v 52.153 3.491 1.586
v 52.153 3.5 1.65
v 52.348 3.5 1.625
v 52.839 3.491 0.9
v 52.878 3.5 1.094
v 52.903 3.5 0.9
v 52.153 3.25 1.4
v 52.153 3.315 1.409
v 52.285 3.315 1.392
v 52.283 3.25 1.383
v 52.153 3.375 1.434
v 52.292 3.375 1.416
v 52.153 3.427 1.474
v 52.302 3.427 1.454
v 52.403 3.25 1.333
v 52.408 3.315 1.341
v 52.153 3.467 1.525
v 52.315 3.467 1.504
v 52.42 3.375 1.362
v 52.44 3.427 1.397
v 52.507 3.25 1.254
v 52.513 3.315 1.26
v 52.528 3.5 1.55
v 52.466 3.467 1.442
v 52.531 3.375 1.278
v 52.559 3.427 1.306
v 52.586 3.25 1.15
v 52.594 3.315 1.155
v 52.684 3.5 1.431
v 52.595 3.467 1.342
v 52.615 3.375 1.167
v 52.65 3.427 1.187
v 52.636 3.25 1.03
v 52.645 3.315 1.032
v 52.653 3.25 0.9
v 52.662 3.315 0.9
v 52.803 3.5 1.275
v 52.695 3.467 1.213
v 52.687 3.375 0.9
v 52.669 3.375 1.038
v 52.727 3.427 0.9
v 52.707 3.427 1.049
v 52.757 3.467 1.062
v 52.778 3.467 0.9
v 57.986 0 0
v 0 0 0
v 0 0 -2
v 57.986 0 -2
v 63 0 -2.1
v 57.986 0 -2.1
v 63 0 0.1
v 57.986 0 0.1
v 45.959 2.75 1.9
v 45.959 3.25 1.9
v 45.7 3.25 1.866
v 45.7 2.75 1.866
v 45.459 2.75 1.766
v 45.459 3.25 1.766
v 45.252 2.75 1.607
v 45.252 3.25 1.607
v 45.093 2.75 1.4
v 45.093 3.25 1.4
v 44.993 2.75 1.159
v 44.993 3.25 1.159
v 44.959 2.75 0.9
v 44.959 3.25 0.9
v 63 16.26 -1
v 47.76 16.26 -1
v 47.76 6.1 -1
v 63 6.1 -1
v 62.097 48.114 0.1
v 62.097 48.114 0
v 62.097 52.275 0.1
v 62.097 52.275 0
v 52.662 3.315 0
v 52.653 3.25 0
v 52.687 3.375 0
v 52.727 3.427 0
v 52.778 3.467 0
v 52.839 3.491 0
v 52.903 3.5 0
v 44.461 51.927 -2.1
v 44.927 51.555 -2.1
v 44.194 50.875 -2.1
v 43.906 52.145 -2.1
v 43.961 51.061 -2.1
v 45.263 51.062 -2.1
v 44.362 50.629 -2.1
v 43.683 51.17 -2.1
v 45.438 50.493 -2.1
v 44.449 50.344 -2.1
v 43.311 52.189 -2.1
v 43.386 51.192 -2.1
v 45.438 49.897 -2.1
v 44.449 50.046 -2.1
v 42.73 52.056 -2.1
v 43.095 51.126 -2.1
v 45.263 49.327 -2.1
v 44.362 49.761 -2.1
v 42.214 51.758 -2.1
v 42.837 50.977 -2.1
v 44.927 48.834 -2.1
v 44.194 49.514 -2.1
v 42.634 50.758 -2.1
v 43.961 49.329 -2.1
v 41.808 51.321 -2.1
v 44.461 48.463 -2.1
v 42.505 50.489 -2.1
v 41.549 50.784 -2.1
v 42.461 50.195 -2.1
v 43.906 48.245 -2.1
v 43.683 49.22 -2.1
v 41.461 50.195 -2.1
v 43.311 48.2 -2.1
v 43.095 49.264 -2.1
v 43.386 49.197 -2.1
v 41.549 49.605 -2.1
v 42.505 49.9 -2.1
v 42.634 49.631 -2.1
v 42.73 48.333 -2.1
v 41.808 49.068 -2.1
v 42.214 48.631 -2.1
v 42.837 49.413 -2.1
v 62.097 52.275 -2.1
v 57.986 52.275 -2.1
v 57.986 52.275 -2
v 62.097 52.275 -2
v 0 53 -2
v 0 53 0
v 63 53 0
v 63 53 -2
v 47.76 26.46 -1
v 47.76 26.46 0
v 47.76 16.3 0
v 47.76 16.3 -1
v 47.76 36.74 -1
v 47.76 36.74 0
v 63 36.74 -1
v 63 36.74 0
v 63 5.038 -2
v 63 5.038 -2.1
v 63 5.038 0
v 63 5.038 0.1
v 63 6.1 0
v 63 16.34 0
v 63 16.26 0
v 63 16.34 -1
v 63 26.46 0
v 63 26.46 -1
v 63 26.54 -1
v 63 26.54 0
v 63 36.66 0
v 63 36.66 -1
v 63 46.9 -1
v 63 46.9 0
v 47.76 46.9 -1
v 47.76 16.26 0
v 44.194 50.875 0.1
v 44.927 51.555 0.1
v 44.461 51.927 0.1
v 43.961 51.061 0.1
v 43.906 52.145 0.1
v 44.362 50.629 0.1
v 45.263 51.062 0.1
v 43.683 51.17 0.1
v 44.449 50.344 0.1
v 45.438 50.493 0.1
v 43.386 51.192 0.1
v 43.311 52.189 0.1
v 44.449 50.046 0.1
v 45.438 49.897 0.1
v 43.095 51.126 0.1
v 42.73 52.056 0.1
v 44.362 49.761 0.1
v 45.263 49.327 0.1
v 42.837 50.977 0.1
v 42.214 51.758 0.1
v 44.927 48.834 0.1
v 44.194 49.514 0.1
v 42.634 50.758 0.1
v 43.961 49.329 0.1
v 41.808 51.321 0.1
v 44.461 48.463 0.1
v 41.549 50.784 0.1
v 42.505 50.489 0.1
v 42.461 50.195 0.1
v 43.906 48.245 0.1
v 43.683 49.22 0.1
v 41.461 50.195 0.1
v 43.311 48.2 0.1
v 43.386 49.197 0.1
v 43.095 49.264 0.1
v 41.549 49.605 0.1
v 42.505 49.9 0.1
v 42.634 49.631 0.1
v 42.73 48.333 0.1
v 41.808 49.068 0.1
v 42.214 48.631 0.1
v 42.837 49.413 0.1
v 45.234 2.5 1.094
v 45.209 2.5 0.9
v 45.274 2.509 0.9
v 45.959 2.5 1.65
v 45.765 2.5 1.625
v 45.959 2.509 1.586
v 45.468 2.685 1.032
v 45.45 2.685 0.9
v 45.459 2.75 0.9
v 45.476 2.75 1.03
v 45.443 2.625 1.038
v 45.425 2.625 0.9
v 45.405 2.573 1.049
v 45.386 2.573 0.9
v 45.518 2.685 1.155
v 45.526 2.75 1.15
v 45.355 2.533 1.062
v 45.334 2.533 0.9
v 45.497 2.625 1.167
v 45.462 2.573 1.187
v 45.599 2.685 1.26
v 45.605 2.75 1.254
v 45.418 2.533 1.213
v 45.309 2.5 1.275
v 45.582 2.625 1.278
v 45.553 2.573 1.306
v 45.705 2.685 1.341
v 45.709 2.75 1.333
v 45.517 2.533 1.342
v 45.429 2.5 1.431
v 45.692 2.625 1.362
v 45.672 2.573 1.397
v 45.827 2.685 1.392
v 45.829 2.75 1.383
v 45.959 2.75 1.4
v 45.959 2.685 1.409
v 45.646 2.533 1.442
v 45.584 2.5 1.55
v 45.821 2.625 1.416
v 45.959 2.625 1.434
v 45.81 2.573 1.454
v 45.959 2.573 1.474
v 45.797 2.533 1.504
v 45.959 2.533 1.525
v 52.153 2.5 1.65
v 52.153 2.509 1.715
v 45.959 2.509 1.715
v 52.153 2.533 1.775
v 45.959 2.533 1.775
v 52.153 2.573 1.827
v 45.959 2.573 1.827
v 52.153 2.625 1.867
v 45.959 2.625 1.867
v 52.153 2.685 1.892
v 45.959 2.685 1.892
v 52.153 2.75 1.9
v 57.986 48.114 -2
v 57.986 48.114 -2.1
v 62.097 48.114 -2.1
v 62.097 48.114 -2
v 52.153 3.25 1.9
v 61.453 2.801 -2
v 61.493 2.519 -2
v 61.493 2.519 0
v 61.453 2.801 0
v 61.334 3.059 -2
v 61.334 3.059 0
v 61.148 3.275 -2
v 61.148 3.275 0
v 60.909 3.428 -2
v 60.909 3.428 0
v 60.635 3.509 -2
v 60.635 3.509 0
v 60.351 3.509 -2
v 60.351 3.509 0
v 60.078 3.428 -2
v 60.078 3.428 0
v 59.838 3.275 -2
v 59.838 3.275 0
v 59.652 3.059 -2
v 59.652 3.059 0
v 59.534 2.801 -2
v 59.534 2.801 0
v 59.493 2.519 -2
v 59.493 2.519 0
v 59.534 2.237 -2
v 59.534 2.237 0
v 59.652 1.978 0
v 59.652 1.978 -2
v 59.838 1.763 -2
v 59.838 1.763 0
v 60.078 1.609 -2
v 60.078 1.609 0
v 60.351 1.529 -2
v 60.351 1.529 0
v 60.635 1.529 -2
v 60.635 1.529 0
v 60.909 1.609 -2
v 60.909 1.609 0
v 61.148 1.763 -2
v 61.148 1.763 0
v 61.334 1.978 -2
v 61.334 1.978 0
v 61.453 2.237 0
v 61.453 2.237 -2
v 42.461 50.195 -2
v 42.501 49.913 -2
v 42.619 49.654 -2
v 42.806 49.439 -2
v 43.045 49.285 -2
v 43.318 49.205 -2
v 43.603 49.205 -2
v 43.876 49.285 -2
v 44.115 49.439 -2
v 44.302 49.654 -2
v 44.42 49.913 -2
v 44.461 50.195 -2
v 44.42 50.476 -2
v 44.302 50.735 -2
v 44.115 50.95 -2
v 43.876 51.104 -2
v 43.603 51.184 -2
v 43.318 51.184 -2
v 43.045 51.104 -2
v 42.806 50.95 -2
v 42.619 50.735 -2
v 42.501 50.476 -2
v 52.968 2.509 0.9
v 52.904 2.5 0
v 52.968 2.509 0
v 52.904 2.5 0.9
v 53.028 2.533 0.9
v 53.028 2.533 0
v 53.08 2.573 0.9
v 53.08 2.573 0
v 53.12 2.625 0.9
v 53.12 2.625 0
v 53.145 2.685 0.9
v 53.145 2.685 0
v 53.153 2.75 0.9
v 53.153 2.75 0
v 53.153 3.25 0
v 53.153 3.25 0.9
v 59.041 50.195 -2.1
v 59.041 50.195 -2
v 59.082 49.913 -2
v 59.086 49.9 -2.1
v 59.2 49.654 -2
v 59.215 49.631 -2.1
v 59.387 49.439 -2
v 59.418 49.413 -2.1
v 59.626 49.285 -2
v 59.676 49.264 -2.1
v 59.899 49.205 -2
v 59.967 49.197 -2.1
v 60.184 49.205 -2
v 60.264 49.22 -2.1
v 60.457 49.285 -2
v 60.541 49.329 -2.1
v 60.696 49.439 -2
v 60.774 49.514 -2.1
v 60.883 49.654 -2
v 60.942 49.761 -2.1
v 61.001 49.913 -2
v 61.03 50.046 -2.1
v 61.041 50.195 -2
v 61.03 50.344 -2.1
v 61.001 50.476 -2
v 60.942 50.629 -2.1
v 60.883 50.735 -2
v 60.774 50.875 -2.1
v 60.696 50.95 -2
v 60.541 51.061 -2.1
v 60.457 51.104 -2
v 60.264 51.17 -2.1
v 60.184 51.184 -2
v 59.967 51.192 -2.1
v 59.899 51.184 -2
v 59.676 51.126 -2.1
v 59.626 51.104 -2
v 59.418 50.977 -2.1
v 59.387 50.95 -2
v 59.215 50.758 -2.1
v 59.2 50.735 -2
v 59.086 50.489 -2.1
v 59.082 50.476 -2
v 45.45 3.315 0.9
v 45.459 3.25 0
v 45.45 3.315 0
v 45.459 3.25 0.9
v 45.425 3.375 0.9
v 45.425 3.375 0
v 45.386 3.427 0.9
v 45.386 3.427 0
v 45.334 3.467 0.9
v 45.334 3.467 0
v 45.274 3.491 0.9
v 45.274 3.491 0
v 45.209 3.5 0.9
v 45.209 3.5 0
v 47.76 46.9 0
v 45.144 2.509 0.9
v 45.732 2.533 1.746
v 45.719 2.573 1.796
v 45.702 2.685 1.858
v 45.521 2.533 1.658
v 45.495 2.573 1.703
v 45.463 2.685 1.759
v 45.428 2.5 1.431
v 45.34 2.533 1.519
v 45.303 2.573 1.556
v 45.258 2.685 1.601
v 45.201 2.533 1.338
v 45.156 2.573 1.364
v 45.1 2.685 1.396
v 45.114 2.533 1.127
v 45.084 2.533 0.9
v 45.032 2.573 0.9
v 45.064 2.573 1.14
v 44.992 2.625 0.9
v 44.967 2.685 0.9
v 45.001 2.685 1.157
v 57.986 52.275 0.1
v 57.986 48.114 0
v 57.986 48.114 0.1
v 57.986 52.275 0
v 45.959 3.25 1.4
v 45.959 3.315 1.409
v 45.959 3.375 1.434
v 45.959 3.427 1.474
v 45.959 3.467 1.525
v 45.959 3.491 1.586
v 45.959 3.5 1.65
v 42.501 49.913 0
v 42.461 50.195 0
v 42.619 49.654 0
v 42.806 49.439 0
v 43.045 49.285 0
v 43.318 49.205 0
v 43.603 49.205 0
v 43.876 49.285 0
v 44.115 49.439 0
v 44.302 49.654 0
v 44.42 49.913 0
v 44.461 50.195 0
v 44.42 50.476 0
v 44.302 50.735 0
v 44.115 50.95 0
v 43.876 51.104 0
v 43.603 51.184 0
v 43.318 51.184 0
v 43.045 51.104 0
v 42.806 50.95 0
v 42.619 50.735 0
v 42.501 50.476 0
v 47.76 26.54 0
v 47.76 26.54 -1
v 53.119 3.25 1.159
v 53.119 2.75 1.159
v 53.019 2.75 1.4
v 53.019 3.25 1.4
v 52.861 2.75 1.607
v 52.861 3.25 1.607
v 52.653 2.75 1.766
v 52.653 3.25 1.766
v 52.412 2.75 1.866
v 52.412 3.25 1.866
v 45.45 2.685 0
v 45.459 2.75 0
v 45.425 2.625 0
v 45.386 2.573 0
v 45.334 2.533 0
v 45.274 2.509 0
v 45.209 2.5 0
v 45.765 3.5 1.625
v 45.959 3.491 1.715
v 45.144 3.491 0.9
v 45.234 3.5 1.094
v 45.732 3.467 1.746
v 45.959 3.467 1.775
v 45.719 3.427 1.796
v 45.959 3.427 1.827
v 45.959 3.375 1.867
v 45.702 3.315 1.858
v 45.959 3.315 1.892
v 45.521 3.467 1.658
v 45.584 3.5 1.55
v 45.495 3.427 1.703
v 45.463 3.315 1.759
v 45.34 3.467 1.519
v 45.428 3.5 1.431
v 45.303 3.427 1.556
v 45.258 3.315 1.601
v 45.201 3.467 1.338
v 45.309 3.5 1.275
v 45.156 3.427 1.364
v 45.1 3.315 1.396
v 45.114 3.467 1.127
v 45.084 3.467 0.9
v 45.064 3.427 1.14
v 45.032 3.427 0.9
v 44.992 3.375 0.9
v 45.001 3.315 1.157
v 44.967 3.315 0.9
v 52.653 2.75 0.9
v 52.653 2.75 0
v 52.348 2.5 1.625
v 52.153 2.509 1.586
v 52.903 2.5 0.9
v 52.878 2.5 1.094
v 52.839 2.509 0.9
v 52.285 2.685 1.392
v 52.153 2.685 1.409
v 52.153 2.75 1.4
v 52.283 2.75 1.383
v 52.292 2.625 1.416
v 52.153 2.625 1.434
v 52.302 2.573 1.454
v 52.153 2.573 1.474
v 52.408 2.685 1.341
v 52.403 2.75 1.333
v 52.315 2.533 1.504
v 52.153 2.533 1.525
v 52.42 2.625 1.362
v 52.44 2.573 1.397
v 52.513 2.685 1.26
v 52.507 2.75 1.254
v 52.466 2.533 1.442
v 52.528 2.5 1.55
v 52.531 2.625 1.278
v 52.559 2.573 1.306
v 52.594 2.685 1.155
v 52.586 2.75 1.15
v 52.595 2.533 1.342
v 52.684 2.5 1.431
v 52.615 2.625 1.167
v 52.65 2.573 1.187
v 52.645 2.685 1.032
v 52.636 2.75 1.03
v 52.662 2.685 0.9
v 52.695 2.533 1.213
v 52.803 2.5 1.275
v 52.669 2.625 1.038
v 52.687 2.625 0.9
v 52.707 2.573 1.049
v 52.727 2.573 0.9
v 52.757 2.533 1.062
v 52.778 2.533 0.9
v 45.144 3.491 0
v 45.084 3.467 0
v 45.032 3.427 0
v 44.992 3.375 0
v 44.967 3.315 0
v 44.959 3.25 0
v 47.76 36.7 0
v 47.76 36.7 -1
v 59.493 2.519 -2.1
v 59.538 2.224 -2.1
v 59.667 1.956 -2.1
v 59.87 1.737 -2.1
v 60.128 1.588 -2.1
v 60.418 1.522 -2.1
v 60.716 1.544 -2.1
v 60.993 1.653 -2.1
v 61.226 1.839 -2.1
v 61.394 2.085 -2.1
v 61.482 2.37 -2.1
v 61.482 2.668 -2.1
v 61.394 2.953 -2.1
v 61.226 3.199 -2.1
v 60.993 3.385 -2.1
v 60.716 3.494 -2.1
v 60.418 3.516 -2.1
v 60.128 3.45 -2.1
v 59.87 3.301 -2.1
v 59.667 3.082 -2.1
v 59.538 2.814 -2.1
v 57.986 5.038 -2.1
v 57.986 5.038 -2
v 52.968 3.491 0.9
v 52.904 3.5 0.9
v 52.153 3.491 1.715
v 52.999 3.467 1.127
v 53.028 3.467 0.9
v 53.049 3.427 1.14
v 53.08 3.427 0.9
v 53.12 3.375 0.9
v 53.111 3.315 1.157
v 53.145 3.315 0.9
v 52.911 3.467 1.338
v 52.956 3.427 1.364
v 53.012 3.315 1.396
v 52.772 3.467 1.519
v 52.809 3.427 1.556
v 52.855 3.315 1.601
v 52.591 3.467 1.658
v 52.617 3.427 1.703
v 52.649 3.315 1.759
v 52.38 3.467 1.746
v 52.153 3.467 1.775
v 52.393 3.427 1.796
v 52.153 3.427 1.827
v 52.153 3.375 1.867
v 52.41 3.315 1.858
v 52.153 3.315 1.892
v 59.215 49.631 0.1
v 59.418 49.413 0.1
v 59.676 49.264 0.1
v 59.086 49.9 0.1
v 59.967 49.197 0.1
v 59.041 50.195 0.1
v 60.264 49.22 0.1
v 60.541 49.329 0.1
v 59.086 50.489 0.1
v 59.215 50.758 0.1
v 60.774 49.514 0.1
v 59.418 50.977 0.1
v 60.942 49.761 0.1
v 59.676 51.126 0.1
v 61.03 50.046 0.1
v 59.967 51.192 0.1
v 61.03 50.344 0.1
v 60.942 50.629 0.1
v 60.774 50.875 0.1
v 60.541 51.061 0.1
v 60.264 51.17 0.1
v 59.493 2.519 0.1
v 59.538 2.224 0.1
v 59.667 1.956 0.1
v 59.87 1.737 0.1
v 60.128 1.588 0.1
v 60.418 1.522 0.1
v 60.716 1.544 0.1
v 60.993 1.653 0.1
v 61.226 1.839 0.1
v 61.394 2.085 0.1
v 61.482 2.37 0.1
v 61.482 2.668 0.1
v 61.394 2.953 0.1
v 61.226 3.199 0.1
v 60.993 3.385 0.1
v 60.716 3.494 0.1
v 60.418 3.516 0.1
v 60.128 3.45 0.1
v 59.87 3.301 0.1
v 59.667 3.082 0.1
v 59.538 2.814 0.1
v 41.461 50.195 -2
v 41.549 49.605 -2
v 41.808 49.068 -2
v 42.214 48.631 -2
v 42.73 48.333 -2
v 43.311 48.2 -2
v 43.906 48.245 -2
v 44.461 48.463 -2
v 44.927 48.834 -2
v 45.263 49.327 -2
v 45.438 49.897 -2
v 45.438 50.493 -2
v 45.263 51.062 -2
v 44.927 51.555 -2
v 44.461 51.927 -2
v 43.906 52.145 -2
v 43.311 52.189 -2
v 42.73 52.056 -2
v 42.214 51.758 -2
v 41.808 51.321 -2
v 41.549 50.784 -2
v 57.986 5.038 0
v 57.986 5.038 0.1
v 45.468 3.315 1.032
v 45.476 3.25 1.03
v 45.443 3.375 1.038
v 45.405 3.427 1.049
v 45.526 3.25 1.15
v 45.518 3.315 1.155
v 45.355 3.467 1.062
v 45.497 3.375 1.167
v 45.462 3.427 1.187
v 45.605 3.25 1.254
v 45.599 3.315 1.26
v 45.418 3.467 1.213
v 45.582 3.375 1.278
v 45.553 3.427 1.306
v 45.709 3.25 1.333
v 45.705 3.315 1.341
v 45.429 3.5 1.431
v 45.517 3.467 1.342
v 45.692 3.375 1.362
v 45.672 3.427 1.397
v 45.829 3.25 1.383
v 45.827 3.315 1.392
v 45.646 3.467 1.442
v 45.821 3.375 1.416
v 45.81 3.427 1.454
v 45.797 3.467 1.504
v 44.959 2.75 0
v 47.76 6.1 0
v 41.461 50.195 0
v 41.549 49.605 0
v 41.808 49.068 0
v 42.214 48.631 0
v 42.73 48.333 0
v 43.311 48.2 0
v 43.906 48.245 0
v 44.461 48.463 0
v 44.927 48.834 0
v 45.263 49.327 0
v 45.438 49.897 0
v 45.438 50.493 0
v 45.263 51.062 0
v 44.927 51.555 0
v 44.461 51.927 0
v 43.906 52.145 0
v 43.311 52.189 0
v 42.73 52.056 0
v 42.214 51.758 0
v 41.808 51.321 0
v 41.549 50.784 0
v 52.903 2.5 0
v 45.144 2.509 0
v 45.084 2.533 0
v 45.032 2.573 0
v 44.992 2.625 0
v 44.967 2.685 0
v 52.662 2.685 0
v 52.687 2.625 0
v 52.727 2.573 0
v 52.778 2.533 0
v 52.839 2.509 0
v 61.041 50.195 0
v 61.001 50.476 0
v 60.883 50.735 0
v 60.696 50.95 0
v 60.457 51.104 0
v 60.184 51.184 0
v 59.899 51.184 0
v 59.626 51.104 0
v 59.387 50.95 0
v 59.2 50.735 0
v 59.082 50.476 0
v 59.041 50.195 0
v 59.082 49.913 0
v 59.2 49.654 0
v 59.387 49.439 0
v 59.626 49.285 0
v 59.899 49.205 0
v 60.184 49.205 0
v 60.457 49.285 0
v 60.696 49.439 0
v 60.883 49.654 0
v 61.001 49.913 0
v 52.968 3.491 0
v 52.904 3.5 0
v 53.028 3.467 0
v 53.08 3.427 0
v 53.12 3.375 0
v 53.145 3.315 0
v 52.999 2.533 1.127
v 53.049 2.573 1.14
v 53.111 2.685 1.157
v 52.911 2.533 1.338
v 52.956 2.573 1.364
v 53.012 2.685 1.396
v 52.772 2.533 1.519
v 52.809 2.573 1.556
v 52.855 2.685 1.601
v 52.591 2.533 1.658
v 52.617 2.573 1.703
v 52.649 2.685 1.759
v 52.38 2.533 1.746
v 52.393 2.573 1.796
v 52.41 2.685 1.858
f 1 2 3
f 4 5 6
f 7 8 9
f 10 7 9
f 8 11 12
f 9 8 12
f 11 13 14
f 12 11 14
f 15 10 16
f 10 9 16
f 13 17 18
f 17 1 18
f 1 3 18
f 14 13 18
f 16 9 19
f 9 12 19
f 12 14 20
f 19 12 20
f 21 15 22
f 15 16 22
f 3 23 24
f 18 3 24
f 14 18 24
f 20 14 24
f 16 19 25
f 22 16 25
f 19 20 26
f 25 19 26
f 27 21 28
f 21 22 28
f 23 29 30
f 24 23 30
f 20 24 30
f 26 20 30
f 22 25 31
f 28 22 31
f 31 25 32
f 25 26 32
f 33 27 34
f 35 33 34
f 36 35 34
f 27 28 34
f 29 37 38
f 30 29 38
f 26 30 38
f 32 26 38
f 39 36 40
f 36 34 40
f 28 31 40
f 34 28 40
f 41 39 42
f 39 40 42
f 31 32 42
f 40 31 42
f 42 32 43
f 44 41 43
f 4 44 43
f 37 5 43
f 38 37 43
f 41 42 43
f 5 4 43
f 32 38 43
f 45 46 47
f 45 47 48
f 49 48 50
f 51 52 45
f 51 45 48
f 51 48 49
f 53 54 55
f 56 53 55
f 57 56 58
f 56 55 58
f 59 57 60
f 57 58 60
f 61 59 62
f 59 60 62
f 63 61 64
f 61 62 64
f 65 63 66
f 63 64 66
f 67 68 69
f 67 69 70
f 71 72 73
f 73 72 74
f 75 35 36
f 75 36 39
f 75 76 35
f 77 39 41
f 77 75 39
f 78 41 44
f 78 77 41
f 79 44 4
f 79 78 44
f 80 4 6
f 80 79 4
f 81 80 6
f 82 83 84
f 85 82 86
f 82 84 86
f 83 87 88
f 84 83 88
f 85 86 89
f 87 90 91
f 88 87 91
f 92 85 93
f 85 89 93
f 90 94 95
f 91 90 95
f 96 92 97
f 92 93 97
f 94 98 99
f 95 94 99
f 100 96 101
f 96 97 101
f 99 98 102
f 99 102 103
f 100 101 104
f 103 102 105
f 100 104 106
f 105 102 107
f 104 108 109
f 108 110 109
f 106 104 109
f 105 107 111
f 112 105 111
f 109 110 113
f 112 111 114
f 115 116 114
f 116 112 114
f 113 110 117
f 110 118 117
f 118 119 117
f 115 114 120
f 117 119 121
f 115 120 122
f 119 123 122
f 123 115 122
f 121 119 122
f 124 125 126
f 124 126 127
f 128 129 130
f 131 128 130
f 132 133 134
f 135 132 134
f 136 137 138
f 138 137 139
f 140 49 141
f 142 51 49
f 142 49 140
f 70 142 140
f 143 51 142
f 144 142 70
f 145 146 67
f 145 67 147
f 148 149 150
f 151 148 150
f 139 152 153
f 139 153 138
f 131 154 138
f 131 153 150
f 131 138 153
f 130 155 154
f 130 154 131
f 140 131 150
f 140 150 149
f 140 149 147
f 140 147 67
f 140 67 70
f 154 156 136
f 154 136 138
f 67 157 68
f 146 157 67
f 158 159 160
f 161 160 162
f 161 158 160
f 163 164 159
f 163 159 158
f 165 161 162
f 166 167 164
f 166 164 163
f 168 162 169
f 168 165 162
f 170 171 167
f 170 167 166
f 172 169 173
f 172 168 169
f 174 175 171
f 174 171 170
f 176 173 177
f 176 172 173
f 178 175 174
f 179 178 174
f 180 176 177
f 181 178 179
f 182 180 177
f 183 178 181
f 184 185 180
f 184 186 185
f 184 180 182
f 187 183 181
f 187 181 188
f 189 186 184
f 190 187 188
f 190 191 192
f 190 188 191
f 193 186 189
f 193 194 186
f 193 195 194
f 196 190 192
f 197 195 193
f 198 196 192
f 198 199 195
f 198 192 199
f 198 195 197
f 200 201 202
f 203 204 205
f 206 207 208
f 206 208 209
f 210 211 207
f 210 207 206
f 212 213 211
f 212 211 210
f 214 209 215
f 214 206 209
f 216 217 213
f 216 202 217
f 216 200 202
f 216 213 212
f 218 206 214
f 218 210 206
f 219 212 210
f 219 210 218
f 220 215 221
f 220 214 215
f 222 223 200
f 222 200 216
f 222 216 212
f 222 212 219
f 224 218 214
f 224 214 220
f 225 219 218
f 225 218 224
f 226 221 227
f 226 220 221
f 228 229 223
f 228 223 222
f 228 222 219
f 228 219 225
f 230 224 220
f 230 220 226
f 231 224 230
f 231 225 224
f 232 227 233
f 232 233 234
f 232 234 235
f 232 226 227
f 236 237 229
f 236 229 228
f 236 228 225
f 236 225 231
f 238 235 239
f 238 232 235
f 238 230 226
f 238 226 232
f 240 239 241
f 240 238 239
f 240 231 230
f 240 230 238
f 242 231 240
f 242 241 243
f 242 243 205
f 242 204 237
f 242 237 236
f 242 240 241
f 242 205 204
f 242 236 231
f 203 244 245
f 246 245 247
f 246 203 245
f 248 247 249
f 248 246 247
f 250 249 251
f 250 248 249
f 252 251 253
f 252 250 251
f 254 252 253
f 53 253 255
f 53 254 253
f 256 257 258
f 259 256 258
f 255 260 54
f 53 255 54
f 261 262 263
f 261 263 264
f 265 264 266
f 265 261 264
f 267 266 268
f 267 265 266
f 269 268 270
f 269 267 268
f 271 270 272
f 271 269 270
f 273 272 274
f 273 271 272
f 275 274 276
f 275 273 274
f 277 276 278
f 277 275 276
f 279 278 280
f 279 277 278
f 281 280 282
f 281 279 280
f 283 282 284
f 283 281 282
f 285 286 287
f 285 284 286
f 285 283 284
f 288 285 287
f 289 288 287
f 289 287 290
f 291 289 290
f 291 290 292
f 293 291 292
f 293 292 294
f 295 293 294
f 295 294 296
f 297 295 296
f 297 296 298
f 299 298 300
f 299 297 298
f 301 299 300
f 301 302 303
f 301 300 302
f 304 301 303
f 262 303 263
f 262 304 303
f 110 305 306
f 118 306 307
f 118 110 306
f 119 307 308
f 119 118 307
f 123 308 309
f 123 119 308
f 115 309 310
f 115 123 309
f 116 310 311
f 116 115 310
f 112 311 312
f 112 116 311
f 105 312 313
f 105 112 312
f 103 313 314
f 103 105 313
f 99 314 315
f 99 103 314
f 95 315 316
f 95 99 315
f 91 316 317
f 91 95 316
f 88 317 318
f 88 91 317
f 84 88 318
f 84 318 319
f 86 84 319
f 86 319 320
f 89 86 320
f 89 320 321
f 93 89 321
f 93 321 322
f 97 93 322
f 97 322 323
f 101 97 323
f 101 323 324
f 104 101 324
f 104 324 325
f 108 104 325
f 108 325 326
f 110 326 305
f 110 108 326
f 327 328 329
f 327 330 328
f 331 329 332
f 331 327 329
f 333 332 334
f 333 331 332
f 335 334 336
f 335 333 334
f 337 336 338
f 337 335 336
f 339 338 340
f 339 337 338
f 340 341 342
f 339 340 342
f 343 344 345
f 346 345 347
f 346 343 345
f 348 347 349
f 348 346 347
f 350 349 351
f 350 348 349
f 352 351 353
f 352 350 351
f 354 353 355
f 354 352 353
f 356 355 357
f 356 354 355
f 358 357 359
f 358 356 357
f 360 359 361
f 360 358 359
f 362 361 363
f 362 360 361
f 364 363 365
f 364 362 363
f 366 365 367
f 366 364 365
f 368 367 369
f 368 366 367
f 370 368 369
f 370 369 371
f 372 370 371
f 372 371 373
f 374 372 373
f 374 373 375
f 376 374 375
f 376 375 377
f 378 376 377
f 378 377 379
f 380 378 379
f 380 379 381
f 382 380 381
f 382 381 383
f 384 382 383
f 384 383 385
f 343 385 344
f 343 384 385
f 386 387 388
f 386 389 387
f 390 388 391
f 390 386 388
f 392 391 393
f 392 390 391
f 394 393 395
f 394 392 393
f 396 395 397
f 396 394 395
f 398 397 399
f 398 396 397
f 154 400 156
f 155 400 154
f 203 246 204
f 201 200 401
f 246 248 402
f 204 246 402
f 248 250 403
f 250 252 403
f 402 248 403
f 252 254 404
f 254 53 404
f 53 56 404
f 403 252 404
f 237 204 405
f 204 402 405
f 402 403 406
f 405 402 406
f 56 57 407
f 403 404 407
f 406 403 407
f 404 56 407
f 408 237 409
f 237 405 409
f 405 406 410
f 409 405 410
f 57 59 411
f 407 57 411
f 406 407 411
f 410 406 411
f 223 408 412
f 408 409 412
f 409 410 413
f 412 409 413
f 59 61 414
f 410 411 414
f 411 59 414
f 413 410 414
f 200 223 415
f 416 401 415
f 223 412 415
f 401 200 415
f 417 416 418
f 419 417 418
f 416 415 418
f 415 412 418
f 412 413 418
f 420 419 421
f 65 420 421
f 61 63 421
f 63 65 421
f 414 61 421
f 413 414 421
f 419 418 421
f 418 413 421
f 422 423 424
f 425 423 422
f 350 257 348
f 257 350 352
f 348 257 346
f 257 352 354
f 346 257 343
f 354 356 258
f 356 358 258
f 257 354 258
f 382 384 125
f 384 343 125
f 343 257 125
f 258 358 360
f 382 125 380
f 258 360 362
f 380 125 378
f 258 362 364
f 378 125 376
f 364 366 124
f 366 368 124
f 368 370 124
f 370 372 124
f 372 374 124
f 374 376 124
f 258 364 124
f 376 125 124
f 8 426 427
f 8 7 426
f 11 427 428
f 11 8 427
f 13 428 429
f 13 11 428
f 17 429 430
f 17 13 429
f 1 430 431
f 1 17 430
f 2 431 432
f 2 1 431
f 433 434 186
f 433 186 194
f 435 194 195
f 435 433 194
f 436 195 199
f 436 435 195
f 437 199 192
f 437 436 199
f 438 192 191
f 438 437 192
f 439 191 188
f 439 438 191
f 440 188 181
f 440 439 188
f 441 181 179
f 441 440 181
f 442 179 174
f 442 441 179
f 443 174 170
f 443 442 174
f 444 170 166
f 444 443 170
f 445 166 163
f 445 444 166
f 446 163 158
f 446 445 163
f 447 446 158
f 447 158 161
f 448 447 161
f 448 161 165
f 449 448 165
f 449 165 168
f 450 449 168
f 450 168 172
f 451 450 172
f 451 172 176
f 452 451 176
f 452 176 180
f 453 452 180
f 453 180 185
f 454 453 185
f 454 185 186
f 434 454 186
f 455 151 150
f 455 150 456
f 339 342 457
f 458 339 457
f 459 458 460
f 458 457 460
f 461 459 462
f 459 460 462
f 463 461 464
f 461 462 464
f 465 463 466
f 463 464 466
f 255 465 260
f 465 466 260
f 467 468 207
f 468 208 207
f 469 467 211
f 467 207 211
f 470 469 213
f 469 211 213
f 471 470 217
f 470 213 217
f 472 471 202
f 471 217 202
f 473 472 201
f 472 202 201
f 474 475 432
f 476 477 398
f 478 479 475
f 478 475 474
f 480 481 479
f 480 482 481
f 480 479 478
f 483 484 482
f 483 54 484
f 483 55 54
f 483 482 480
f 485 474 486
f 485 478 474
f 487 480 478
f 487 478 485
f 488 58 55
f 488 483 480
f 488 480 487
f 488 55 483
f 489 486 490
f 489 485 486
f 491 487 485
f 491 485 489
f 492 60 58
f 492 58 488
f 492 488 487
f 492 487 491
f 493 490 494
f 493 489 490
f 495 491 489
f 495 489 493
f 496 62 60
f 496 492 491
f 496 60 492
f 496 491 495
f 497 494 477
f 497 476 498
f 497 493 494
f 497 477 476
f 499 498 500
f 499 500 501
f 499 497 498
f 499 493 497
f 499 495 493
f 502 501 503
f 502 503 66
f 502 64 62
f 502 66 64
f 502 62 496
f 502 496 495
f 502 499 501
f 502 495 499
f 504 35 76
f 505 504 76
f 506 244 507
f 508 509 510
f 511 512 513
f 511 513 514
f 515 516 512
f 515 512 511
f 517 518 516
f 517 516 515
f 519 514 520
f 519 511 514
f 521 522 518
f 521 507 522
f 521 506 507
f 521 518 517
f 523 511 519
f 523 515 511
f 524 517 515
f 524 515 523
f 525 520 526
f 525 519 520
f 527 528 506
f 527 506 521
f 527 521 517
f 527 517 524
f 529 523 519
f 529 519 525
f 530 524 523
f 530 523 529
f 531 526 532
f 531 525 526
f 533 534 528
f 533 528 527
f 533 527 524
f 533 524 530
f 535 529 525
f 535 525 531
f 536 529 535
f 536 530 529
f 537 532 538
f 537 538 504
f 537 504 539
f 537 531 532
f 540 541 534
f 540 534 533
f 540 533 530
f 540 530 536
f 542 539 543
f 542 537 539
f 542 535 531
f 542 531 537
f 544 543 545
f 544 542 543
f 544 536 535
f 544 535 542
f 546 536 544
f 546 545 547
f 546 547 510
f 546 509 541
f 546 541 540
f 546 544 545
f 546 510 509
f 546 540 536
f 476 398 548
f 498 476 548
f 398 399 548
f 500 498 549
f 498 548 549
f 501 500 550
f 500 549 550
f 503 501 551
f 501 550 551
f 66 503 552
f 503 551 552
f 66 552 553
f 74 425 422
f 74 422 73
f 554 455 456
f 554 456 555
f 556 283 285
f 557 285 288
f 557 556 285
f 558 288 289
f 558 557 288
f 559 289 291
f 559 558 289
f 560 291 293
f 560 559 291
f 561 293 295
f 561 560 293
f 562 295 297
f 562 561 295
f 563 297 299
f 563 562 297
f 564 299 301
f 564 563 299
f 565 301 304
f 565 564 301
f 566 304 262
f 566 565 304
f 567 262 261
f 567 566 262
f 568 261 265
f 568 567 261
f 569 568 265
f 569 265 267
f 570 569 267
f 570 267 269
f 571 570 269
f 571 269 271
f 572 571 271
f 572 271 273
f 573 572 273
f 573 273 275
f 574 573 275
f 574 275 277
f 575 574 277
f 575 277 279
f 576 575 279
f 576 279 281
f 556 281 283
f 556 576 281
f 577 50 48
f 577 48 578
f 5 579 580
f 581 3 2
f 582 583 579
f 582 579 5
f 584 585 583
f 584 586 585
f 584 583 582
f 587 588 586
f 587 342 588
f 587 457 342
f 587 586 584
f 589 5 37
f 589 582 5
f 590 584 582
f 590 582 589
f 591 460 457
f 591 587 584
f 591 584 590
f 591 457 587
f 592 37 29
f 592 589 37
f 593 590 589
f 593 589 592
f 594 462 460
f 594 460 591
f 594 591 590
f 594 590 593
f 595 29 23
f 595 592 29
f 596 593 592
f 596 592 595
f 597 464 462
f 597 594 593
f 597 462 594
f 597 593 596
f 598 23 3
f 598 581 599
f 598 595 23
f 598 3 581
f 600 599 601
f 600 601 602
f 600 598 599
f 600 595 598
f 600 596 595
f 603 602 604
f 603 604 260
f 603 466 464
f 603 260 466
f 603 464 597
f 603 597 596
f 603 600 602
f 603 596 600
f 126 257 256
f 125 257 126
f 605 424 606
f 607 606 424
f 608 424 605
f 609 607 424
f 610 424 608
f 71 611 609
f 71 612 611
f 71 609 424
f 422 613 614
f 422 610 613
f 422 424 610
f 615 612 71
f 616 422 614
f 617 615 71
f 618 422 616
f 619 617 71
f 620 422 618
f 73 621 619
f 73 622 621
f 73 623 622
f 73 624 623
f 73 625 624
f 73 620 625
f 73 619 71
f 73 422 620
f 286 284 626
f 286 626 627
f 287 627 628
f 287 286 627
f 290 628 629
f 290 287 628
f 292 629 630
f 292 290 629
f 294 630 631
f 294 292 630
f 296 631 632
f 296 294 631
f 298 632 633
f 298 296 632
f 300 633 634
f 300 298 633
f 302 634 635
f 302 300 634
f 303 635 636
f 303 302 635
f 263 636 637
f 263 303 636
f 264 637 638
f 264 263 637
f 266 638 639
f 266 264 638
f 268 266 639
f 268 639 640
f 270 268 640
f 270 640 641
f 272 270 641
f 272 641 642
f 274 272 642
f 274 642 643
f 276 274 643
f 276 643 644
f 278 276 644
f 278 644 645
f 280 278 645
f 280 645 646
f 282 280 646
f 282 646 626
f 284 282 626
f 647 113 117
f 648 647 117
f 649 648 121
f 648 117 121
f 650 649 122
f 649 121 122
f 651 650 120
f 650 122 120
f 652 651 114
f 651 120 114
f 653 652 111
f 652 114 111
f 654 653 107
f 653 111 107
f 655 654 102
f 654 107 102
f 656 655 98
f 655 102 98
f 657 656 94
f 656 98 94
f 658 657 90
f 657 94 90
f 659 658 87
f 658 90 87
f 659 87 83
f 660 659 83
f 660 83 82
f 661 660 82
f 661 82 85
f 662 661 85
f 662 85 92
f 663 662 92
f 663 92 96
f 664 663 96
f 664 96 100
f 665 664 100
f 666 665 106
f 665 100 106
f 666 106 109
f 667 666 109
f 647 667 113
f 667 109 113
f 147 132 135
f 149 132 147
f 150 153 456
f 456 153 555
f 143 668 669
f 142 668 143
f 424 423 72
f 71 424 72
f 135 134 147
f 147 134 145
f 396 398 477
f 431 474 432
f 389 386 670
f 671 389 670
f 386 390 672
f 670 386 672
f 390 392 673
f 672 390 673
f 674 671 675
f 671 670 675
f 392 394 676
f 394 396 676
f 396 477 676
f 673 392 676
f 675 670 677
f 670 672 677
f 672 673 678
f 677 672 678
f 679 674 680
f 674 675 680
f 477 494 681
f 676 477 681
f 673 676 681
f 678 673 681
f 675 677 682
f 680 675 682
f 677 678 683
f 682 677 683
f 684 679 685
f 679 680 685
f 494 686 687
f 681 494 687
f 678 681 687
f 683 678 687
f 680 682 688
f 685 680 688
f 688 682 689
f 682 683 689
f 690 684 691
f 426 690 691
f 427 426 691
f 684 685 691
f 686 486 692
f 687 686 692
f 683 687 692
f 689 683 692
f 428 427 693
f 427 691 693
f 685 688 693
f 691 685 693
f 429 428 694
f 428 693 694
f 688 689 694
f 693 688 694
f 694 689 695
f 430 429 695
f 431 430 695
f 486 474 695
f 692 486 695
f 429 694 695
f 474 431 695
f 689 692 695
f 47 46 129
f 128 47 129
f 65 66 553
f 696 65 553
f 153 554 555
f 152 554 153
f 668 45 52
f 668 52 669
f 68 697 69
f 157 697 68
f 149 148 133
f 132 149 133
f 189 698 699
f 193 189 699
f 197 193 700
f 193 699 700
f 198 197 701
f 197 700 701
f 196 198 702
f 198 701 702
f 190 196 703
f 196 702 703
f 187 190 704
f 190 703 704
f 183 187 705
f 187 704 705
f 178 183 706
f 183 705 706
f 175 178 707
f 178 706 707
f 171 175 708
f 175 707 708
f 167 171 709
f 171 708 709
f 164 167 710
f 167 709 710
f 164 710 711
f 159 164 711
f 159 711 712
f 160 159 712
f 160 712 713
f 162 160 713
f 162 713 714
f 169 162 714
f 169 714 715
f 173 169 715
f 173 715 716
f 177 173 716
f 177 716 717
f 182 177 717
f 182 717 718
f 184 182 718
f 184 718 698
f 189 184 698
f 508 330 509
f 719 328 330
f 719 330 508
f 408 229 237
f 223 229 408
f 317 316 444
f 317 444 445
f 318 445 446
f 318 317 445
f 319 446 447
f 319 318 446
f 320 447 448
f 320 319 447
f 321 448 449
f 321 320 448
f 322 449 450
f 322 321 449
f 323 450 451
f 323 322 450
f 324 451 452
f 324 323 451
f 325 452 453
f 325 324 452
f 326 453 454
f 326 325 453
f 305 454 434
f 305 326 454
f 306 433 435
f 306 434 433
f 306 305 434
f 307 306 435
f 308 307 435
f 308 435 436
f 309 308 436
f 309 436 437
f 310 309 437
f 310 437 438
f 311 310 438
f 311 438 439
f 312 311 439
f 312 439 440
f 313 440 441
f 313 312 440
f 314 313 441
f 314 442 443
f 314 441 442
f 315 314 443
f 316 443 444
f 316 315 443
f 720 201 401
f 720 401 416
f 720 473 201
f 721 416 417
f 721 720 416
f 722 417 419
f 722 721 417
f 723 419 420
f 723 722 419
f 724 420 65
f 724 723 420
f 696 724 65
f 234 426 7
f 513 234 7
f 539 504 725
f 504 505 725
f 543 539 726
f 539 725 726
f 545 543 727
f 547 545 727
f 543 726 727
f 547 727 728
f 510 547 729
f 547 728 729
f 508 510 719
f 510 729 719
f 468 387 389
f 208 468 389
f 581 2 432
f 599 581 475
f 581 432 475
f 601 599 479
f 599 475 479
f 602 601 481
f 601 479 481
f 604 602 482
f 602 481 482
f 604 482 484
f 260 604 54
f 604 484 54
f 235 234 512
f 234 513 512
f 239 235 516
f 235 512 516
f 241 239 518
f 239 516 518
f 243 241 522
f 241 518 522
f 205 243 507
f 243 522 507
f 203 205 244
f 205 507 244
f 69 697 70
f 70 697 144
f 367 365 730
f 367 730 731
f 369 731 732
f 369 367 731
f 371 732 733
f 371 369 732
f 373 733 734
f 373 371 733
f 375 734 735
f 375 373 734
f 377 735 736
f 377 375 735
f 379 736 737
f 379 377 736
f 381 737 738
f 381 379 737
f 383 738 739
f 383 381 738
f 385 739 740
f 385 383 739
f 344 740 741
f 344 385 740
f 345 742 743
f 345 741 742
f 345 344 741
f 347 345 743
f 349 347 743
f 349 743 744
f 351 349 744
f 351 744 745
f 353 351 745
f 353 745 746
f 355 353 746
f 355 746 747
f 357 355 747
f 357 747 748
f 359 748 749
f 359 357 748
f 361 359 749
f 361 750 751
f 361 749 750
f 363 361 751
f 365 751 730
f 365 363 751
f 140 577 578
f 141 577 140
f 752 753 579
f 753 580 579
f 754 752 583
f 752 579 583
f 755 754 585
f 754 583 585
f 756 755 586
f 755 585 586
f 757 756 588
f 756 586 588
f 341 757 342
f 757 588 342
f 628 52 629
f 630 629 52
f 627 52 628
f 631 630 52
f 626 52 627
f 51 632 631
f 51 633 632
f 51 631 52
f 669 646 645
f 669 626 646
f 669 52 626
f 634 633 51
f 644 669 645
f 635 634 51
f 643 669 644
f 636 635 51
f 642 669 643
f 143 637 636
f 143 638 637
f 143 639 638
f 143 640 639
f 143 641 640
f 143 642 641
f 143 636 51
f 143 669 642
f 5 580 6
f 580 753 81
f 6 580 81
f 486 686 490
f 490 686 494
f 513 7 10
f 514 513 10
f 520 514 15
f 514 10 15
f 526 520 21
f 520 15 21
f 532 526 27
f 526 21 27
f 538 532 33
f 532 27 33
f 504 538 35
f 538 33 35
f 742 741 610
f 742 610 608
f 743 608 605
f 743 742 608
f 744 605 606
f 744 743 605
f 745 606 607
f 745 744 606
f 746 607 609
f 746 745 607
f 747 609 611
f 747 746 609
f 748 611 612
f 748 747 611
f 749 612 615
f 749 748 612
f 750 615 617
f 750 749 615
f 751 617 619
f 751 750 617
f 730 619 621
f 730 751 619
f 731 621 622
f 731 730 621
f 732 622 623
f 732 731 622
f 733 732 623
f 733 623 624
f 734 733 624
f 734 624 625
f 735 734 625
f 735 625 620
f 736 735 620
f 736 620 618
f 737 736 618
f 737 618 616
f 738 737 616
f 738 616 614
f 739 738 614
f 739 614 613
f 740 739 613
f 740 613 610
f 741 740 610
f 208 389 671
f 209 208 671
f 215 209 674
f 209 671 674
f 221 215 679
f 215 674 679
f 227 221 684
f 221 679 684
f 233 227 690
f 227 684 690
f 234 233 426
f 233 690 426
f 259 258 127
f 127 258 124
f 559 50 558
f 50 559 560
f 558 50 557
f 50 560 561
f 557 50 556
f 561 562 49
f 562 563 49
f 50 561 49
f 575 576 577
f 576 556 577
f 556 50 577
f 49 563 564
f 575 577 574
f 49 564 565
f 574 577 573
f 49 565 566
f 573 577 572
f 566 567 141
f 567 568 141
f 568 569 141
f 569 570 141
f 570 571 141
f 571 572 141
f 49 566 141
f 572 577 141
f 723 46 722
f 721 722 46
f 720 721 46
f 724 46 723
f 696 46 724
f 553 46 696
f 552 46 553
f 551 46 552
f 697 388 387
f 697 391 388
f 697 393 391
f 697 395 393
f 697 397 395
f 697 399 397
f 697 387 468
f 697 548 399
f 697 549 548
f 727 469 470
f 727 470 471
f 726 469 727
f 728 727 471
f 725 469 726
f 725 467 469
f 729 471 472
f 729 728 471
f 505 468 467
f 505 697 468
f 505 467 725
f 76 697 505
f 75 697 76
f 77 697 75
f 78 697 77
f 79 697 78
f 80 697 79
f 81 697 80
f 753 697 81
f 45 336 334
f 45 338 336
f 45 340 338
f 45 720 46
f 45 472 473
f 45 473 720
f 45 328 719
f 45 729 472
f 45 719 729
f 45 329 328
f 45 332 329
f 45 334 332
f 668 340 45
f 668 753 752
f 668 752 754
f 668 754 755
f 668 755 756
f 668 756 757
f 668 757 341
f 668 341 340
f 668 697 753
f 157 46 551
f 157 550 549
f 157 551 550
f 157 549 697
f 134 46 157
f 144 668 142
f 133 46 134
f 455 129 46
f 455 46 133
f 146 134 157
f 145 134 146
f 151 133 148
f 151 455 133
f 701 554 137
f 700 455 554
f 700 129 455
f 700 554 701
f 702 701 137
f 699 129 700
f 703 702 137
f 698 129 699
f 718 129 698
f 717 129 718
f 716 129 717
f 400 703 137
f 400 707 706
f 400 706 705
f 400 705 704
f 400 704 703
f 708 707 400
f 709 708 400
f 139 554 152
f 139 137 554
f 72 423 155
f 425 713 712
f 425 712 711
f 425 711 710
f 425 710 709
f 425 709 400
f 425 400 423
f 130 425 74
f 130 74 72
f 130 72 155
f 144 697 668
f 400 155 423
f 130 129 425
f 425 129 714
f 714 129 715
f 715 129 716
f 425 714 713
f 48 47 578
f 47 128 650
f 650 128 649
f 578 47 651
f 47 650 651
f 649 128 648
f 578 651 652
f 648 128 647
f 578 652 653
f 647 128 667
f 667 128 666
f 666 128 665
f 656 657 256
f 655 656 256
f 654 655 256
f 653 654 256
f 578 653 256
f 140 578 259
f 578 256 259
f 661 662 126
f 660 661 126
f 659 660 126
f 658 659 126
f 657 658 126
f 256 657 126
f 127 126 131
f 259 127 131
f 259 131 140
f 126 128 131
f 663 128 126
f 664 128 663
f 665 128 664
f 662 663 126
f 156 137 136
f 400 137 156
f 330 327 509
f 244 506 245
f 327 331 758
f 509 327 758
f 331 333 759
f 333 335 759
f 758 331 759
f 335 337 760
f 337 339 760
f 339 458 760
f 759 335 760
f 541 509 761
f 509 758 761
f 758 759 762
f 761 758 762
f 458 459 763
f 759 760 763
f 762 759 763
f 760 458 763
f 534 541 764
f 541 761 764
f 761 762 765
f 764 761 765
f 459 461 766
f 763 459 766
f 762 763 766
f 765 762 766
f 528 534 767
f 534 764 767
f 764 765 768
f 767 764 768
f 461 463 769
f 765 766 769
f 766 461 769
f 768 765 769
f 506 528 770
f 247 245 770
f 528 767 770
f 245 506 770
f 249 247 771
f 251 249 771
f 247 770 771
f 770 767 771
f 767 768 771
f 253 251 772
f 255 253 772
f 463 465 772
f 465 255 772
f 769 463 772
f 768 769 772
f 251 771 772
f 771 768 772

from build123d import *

# Parameters (mm, degrees)
SKETCH1_W                = 63
SKETCH1_H                = 53
BOSS_EXTRUDE1_DEPTH      = 2
SKETCH2_W                = 15.24
SKETCH2_H                = 10.16
CUT_EXTRUDE1_DEPTH       = 1
BOSS_EXTRUDE2_DEPTH      = 0.1
BOSS_EXTRUDE2_DEPTH_BACK = 2.1
SKETCH4_R                = 2
SKETCH4_R_2              = 1
SKETCH4_W                = 5.013644296
SKETCH4_H                = 5.037668264
SKETCH4_W_2              = 4.110148076
SKETCH4_H_2              = 4.160405132
CUT_EXTRUDE2_START       = -2
SKETCH5_R                = 1
CUT_EXTRUDE2_DEPTH       = 2
EXTRUDE_THIN1_DEPTH      = 0.5
EXTRUDE_THIN1_DEPTH_BACK = 0.5
FILLET1_R                = 0.25


with BuildPart() as part:
    # Sketch1 → Boss-Extrude1 (new body)
    with BuildSketch(Plane.XY):
        with Locations((31.5, 26.5)):
            Rectangle(SKETCH1_W, SKETCH1_H)
    extrude(amount=-BOSS_EXTRUDE1_DEPTH)

    # Sketch2 → Cut-Extrude1 (cut)
    with BuildSketch(Plane.XY):
        Polygon((63, 26.54), (47.76, 26.54), (47.76, 36.7), (63, 36.66), align=None)
        with Locations((55.38, 41.82)):
            Rectangle(SKETCH2_W, SKETCH2_H)
        with Locations((55.38, 11.18)):
            Rectangle(SKETCH2_W, SKETCH2_H)
        Polygon((47.76, 16.3), (63, 16.34), (63, 26.46), (47.76, 26.46), align=None)
    extrude(amount=-CUT_EXTRUDE1_DEPTH, mode=Mode.SUBTRACT)

    # Sketch4 → Boss-Extrude2 (add, two sides: drawn at the far end of the back side and taken through both)
    # profile 1 of 3: a face of its own
    with BuildSketch(Plane.XY.offset(-BOSS_EXTRUDE2_DEPTH_BACK)):
        with Locations(Location((43.460589495, 50.19467241, 0), (0, 0, 180))):
            Circle(SKETCH4_R)
        with Locations(Location((43.460589495, 50.19467241, 0), (0, 0, 180))):
            Circle(SKETCH4_R_2, mode=Mode.SUBTRACT)
    # profile 2 of 3: a face of its own
    with BuildSketch(Plane.XY.offset(-BOSS_EXTRUDE2_DEPTH_BACK)):
        with Locations((60.493177852, 2.518834132)):
            Rectangle(SKETCH4_W, SKETCH4_H)
        with Locations(Location((60.493177852, 2.518834132, 0), (0, 0, 180))):
            Circle(SKETCH4_R_2, mode=Mode.SUBTRACT)
    # profile 3 of 3: a face of its own
    with BuildSketch(Plane.XY.offset(-BOSS_EXTRUDE2_DEPTH_BACK)):
        with Locations((60.041429742, 50.19467241)):
            Rectangle(SKETCH4_W_2, SKETCH4_H_2)
        with Locations(Location((60.041429742, 50.19467241, 0), (0, 0, 180))):
            Circle(SKETCH4_R_2, mode=Mode.SUBTRACT)
    extrude(amount=BOSS_EXTRUDE2_DEPTH + BOSS_EXTRUDE2_DEPTH_BACK)

    # Sketch5 → Cut-Extrude2 (cut)
    with BuildSketch(Plane.XY.offset(CUT_EXTRUDE2_START)):
        with Locations((60.493177852, 2.518834132)):
            Circle(SKETCH5_R)
        with Locations((60.041429742, 50.19467241)):
            Circle(SKETCH5_R)
        with Locations((43.460589495, 50.19467241)):
            Circle(SKETCH5_R)
    extrude(amount=CUT_EXTRUDE2_DEPTH, mode=Mode.SUBTRACT)

    # Sketch6 → Extrude-Thin1 (add, two sides: drawn at the far end of the back side and taken through both)
    with BuildSketch(Plane(origin=(0, 3, 0), x_dir=(-1, 0, 0), z_dir=(0, -1, 0)).offset(-EXTRUDE_THIN1_DEPTH_BACK)):
        with BuildLine():
            Line((-45.458769881, 0.670572303), (-45.458769881, -0.900340835))
            ThreePointArc((-45.458769881, -0.900340835), (-45.605216491, -1.253894226), (-45.958769881, -1.400340835))
            Line((-45.958769881, -1.400340835), (-52.153437165, -1.400340835))
            ThreePointArc((-52.153437165, -1.400340835), (-52.506990556, -1.253894226), (-52.653437165, -0.900340835))
            Line((-52.653437165, -0.900340835), (-52.653437165, 0.670572303))
            Line((-52.653437165, 0.670572303), (-53.153437165, 0.670572303))
            Line((-53.153437165, 0.670572303), (-53.153437165, -0.900340835))
            ThreePointArc((-53.153437165, -0.900340835), (-52.860543946, -1.607447616), (-52.153437165, -1.900340835))
            Line((-52.153437165, -1.900340835), (-45.958769881, -1.900340835))
            ThreePointArc((-45.958769881, -1.900340835), (-45.2516631, -1.607447616), (-44.958769881, -0.900340835))
            Line((-44.958769881, -0.900340835), (-44.958769881, 0.670572303))
            Line((-44.958769881, 0.670572303), (-45.458769881, 0.670572303))
        make_face()
    extrude(amount=EXTRUDE_THIN1_DEPTH + EXTRUDE_THIN1_DEPTH_BACK)

    # Fillet1
    fillet1_edges = [part.edges().sort_by_distance(p)[0] for p in [
        (45.458769881, 3.5, 0.450170417),
        (45.605216491, 3.5, 1.253894226),
        (52.653437165, 3.5, 0.450170417),
        (52.506990556, 3.5, 1.253894226),
        (45.458769881, 2.5, 0.450170417),
        (45.605216491, 2.5, 1.253894226),
        (52.653437165, 2.5, 0.450170417),
        (52.506990556, 2.5, 1.253894226),
        (44.958769881, 3.5, 0.450170417),
        (45.2516631, 3.5, 1.607447616),
        (53.153437165, 3.5, 0.450170417),
        (52.860543946, 3.5, 1.607447616),
        (44.958769881, 2.5, 0.450170417),
        (53.153437165, 2.5, 0.450170417),
        (52.860543946, 2.5, 1.607447616),
        (49.056103523, 2.5, 1.900340835),
        (49.056103523, 3.5, 1.400340835),
        (49.056103523, 2.5, 1.400340835),
        (49.056103523, 3.5, 1.900340835),
        (45.2516631, 2.5, 1.607447616),
    ]]
    fillet(fillet1_edges, radius=FILLET1_R - 0.0001)  # a hair under: the kernel refuses the full size


solid = part.part
